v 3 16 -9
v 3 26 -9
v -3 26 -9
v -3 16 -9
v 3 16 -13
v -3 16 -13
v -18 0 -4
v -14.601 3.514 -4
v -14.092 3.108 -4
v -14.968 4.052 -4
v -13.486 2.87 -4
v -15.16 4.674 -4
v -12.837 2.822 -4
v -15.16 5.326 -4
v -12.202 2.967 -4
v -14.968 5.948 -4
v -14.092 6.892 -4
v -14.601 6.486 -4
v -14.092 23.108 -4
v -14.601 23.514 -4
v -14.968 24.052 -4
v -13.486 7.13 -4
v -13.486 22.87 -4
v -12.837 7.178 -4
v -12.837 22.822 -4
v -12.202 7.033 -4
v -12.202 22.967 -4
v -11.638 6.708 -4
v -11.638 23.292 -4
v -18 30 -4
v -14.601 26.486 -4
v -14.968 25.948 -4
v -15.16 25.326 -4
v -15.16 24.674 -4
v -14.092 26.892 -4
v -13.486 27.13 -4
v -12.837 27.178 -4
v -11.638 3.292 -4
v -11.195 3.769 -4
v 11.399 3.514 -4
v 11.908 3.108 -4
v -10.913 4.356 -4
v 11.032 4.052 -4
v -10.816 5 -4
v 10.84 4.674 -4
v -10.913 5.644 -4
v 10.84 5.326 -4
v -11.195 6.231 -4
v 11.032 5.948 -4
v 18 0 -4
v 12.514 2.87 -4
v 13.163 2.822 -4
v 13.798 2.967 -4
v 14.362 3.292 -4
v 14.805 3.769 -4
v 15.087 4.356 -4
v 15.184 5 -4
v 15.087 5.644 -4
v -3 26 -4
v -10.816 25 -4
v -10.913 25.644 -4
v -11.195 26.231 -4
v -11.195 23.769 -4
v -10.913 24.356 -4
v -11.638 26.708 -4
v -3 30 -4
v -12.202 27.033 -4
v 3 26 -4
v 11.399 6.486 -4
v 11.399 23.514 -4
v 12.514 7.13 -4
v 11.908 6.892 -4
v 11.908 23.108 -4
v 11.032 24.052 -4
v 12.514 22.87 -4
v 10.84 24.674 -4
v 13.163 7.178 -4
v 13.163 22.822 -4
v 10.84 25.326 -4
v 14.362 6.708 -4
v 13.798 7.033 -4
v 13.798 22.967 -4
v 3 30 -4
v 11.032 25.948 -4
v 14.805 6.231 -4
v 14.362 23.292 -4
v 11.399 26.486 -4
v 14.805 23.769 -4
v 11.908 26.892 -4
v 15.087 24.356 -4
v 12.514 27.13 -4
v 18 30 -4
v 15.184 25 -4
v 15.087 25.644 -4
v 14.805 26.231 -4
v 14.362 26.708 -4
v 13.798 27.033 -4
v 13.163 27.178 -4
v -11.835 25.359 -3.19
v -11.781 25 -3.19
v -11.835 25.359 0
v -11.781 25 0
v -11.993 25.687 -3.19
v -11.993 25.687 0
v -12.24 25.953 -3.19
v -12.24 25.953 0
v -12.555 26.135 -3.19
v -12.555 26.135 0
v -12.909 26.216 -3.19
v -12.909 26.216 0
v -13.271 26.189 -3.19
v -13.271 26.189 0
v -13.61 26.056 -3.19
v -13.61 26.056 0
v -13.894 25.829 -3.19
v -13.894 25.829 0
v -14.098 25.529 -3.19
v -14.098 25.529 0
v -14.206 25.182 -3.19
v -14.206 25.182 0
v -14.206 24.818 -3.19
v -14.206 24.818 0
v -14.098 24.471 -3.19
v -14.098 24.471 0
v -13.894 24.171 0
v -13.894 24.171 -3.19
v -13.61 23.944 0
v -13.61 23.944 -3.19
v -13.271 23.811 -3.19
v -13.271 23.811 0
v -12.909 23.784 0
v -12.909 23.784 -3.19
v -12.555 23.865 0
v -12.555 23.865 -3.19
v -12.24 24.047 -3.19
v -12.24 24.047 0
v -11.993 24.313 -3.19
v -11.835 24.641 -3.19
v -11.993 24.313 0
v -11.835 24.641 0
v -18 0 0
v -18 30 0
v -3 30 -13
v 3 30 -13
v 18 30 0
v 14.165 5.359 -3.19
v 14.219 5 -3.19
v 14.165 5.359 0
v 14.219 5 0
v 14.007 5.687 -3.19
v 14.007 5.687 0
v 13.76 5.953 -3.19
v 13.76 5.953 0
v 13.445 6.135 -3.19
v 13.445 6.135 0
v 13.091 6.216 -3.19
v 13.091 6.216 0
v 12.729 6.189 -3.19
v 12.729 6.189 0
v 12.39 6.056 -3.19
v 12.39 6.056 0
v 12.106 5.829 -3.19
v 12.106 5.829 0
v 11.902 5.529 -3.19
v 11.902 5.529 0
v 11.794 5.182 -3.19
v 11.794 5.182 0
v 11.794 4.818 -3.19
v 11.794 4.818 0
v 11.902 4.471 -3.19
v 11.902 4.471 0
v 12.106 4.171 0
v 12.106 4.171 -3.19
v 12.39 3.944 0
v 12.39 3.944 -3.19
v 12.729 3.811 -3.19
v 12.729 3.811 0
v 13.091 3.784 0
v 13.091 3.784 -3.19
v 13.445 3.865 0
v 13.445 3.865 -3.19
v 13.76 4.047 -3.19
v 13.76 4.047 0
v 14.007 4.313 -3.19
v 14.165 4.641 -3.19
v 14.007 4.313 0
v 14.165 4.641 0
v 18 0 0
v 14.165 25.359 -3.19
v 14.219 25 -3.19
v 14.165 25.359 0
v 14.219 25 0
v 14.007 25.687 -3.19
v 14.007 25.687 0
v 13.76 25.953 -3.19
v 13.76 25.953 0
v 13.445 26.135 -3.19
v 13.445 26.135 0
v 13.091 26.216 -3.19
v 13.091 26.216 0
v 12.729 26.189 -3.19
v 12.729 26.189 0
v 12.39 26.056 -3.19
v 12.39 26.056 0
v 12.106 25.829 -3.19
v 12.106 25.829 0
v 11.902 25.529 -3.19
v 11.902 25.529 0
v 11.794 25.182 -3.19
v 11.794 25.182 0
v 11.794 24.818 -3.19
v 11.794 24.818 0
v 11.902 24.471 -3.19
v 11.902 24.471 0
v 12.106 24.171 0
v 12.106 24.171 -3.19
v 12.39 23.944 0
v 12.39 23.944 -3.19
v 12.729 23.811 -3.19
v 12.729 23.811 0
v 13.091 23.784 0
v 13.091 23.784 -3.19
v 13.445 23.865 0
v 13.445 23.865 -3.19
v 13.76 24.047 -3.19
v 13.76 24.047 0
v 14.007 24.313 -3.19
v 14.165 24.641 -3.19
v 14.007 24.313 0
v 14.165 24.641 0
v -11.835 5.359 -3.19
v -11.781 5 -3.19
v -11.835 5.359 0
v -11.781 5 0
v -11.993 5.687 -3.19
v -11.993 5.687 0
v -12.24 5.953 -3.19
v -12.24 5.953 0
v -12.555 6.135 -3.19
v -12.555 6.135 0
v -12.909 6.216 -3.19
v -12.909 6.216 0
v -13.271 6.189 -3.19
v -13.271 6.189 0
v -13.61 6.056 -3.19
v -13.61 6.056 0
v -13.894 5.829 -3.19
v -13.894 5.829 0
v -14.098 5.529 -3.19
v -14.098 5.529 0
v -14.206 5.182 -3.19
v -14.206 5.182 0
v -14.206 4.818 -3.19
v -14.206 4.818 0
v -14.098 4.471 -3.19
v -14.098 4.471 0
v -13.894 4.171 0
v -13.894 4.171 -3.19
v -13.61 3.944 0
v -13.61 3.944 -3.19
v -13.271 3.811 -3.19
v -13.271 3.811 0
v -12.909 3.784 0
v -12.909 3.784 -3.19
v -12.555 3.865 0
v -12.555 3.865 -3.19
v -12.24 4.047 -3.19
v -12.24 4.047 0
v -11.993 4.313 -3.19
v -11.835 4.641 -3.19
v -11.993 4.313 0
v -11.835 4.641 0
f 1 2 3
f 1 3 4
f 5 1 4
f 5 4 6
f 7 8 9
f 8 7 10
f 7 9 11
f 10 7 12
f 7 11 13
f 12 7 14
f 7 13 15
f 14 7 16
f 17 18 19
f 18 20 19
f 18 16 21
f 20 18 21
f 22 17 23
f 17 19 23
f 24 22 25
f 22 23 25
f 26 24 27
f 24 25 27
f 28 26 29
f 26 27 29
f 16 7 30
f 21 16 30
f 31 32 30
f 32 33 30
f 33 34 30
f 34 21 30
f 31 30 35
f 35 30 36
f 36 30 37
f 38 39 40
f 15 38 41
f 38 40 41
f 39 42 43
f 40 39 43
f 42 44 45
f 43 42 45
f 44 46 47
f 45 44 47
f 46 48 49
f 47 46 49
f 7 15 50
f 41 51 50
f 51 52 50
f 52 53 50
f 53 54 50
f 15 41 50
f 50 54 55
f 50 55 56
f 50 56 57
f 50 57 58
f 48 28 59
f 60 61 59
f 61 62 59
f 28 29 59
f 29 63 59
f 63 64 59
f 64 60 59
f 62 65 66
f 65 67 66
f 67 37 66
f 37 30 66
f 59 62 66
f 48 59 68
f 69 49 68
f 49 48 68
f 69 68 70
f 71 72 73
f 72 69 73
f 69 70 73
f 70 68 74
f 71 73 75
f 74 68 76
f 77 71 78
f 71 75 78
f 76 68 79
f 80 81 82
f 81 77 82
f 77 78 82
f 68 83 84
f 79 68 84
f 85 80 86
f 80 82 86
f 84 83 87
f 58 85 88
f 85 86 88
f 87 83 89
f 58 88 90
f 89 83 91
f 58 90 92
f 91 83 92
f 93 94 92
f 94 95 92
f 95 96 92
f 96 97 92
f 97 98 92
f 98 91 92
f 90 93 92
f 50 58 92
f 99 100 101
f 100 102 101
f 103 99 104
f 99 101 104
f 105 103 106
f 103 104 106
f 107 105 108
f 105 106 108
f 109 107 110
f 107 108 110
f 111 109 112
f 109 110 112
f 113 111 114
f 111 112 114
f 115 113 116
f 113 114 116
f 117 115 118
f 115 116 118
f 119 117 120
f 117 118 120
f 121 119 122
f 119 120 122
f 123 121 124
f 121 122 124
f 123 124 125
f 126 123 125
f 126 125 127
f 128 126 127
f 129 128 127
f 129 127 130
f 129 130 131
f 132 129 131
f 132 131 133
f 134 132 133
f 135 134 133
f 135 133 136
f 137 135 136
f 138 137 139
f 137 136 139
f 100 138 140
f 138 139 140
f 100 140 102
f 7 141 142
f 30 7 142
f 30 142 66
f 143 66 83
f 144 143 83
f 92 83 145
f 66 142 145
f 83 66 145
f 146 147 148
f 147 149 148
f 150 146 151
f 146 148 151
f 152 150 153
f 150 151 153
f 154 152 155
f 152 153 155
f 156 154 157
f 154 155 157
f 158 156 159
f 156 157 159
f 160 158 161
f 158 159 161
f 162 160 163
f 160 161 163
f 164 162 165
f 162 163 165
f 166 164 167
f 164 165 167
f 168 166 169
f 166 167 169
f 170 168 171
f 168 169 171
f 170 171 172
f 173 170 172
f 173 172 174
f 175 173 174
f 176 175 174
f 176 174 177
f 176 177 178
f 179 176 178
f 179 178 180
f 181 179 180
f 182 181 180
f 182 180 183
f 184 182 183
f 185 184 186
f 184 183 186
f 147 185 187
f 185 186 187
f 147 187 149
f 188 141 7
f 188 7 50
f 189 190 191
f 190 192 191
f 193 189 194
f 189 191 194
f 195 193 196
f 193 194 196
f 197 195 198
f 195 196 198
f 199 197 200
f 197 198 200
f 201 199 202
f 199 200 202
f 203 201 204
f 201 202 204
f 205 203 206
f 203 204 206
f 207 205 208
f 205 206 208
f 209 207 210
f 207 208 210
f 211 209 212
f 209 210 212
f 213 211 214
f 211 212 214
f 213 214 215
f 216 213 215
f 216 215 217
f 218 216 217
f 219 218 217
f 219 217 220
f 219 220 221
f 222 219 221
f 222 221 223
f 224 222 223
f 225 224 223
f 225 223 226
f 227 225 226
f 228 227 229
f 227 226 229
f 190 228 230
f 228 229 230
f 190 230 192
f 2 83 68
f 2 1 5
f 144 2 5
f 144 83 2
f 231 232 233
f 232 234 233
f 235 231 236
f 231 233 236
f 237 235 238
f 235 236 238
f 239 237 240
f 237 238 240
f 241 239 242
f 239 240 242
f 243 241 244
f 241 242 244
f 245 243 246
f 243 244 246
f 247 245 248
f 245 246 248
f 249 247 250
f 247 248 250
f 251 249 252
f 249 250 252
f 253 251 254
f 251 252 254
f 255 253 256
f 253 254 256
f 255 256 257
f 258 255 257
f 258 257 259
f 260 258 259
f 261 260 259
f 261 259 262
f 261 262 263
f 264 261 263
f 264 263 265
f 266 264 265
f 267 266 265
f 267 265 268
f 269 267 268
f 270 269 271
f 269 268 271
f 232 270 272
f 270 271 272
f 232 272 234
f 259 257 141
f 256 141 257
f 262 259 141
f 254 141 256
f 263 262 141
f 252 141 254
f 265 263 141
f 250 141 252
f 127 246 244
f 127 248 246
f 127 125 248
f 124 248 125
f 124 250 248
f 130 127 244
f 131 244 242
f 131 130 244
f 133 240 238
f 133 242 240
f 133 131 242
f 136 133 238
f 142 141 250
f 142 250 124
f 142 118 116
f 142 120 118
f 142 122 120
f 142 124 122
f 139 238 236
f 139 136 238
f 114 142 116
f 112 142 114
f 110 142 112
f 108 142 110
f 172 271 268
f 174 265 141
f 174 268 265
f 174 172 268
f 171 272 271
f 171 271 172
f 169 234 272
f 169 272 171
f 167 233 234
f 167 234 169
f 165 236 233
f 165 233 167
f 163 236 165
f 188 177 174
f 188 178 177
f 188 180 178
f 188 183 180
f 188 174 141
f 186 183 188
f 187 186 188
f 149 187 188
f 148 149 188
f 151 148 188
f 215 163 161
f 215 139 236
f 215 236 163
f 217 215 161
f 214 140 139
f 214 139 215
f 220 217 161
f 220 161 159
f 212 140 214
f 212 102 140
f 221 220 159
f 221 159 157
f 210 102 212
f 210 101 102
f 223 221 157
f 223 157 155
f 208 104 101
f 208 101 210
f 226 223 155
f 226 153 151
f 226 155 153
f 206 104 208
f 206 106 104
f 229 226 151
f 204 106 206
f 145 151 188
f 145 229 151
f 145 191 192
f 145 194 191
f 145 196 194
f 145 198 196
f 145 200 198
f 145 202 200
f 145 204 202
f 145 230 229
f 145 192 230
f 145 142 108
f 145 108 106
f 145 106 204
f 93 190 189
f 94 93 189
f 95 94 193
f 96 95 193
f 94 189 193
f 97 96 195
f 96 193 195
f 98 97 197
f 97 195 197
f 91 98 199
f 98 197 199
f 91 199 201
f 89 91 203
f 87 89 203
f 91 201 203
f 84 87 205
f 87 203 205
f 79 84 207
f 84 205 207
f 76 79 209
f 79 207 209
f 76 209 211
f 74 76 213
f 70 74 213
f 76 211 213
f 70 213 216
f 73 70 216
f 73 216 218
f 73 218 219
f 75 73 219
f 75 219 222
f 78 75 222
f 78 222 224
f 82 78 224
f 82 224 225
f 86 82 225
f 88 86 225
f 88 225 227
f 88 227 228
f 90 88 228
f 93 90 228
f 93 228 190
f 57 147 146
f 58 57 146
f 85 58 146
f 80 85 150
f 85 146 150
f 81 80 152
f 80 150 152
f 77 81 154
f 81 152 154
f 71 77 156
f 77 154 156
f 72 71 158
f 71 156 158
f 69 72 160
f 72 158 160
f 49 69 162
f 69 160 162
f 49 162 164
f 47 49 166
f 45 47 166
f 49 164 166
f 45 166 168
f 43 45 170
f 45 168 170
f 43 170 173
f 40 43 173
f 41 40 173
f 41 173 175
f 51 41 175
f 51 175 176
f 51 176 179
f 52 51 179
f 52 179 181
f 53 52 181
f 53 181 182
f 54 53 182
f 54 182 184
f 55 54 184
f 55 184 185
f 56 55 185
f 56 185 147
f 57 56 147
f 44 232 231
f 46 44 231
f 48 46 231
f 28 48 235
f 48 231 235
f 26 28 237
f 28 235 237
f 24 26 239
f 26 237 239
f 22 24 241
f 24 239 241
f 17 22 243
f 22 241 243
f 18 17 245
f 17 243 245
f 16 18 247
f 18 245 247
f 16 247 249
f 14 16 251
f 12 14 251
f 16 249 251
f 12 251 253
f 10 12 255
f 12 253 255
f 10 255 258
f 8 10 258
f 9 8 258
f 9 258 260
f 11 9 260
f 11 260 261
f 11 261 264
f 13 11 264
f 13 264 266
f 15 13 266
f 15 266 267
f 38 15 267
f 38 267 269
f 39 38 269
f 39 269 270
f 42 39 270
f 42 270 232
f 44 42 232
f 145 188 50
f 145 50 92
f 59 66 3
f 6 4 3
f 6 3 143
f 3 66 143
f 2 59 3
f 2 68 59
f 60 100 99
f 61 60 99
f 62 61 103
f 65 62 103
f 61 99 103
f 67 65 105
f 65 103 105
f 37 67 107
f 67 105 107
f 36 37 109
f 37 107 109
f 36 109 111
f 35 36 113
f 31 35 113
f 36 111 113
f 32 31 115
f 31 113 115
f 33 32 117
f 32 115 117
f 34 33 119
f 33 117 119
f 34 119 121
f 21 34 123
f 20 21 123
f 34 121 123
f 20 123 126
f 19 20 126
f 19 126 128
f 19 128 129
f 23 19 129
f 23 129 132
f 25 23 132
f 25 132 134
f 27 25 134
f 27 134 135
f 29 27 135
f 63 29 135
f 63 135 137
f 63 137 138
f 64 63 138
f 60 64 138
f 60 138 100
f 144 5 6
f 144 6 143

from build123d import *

# Parameters (mm, degrees)
BOSS_EXTRUDE1_DEPTH                               = 3
SKETCH2_W                                         = 36
SKETCH2_H                                         = 30
BOSS_EXTRUDE2_DEPTH                               = 4
CSK_FOR_2_FLAT_HEAD_MACHINE_SCREW_100_D           = 2.4384
CSK_FOR_2_FLAT_HEAD_MACHINE_SCREW_100_CSINK_D     = 4.3688
CSK_FOR_2_FLAT_HEAD_MACHINE_SCREW_100_CSINK_ANGLE = 100


with BuildPart() as part:
    # Sketch1 → Boss-Extrude1 (new body, symmetric)
    with BuildSketch(Plane(origin=(0, 0, 0), x_dir=(0, 0, -1), z_dir=(1, 0, 0))):
        Polygon((4, 26), (9, 26), (9, 16), (13, 16), (13, 30), (0, 30), (0, 0), (4, 0), align=None)
    extrude(amount=BOSS_EXTRUDE1_DEPTH, both=True)

    # Sketch2 → Boss-Extrude2 (add)
    with BuildSketch(Plane.XY):
        with Locations((0, 15)):
            Rectangle(SKETCH2_W, SKETCH2_H)
    extrude(amount=-BOSS_EXTRUDE2_DEPTH)

    # CSK for #2 Flat Head Machine Screw (100)1 (through all)
    with Locations(Plane(origin=(0, 0, -4), x_dir=(-1, 0, 0), z_dir=(0, 0, -1))):
        with Locations((-13, 25), (-13, 5), (13, 5), (13, 25)):
            CounterSinkHole(CSK_FOR_2_FLAT_HEAD_MACHINE_SCREW_100_D / 2, CSK_FOR_2_FLAT_HEAD_MACHINE_SCREW_100_CSINK_D / 2, counter_sink_angle=CSK_FOR_2_FLAT_HEAD_MACHINE_SCREW_100_CSINK_ANGLE)


solid = part.part
